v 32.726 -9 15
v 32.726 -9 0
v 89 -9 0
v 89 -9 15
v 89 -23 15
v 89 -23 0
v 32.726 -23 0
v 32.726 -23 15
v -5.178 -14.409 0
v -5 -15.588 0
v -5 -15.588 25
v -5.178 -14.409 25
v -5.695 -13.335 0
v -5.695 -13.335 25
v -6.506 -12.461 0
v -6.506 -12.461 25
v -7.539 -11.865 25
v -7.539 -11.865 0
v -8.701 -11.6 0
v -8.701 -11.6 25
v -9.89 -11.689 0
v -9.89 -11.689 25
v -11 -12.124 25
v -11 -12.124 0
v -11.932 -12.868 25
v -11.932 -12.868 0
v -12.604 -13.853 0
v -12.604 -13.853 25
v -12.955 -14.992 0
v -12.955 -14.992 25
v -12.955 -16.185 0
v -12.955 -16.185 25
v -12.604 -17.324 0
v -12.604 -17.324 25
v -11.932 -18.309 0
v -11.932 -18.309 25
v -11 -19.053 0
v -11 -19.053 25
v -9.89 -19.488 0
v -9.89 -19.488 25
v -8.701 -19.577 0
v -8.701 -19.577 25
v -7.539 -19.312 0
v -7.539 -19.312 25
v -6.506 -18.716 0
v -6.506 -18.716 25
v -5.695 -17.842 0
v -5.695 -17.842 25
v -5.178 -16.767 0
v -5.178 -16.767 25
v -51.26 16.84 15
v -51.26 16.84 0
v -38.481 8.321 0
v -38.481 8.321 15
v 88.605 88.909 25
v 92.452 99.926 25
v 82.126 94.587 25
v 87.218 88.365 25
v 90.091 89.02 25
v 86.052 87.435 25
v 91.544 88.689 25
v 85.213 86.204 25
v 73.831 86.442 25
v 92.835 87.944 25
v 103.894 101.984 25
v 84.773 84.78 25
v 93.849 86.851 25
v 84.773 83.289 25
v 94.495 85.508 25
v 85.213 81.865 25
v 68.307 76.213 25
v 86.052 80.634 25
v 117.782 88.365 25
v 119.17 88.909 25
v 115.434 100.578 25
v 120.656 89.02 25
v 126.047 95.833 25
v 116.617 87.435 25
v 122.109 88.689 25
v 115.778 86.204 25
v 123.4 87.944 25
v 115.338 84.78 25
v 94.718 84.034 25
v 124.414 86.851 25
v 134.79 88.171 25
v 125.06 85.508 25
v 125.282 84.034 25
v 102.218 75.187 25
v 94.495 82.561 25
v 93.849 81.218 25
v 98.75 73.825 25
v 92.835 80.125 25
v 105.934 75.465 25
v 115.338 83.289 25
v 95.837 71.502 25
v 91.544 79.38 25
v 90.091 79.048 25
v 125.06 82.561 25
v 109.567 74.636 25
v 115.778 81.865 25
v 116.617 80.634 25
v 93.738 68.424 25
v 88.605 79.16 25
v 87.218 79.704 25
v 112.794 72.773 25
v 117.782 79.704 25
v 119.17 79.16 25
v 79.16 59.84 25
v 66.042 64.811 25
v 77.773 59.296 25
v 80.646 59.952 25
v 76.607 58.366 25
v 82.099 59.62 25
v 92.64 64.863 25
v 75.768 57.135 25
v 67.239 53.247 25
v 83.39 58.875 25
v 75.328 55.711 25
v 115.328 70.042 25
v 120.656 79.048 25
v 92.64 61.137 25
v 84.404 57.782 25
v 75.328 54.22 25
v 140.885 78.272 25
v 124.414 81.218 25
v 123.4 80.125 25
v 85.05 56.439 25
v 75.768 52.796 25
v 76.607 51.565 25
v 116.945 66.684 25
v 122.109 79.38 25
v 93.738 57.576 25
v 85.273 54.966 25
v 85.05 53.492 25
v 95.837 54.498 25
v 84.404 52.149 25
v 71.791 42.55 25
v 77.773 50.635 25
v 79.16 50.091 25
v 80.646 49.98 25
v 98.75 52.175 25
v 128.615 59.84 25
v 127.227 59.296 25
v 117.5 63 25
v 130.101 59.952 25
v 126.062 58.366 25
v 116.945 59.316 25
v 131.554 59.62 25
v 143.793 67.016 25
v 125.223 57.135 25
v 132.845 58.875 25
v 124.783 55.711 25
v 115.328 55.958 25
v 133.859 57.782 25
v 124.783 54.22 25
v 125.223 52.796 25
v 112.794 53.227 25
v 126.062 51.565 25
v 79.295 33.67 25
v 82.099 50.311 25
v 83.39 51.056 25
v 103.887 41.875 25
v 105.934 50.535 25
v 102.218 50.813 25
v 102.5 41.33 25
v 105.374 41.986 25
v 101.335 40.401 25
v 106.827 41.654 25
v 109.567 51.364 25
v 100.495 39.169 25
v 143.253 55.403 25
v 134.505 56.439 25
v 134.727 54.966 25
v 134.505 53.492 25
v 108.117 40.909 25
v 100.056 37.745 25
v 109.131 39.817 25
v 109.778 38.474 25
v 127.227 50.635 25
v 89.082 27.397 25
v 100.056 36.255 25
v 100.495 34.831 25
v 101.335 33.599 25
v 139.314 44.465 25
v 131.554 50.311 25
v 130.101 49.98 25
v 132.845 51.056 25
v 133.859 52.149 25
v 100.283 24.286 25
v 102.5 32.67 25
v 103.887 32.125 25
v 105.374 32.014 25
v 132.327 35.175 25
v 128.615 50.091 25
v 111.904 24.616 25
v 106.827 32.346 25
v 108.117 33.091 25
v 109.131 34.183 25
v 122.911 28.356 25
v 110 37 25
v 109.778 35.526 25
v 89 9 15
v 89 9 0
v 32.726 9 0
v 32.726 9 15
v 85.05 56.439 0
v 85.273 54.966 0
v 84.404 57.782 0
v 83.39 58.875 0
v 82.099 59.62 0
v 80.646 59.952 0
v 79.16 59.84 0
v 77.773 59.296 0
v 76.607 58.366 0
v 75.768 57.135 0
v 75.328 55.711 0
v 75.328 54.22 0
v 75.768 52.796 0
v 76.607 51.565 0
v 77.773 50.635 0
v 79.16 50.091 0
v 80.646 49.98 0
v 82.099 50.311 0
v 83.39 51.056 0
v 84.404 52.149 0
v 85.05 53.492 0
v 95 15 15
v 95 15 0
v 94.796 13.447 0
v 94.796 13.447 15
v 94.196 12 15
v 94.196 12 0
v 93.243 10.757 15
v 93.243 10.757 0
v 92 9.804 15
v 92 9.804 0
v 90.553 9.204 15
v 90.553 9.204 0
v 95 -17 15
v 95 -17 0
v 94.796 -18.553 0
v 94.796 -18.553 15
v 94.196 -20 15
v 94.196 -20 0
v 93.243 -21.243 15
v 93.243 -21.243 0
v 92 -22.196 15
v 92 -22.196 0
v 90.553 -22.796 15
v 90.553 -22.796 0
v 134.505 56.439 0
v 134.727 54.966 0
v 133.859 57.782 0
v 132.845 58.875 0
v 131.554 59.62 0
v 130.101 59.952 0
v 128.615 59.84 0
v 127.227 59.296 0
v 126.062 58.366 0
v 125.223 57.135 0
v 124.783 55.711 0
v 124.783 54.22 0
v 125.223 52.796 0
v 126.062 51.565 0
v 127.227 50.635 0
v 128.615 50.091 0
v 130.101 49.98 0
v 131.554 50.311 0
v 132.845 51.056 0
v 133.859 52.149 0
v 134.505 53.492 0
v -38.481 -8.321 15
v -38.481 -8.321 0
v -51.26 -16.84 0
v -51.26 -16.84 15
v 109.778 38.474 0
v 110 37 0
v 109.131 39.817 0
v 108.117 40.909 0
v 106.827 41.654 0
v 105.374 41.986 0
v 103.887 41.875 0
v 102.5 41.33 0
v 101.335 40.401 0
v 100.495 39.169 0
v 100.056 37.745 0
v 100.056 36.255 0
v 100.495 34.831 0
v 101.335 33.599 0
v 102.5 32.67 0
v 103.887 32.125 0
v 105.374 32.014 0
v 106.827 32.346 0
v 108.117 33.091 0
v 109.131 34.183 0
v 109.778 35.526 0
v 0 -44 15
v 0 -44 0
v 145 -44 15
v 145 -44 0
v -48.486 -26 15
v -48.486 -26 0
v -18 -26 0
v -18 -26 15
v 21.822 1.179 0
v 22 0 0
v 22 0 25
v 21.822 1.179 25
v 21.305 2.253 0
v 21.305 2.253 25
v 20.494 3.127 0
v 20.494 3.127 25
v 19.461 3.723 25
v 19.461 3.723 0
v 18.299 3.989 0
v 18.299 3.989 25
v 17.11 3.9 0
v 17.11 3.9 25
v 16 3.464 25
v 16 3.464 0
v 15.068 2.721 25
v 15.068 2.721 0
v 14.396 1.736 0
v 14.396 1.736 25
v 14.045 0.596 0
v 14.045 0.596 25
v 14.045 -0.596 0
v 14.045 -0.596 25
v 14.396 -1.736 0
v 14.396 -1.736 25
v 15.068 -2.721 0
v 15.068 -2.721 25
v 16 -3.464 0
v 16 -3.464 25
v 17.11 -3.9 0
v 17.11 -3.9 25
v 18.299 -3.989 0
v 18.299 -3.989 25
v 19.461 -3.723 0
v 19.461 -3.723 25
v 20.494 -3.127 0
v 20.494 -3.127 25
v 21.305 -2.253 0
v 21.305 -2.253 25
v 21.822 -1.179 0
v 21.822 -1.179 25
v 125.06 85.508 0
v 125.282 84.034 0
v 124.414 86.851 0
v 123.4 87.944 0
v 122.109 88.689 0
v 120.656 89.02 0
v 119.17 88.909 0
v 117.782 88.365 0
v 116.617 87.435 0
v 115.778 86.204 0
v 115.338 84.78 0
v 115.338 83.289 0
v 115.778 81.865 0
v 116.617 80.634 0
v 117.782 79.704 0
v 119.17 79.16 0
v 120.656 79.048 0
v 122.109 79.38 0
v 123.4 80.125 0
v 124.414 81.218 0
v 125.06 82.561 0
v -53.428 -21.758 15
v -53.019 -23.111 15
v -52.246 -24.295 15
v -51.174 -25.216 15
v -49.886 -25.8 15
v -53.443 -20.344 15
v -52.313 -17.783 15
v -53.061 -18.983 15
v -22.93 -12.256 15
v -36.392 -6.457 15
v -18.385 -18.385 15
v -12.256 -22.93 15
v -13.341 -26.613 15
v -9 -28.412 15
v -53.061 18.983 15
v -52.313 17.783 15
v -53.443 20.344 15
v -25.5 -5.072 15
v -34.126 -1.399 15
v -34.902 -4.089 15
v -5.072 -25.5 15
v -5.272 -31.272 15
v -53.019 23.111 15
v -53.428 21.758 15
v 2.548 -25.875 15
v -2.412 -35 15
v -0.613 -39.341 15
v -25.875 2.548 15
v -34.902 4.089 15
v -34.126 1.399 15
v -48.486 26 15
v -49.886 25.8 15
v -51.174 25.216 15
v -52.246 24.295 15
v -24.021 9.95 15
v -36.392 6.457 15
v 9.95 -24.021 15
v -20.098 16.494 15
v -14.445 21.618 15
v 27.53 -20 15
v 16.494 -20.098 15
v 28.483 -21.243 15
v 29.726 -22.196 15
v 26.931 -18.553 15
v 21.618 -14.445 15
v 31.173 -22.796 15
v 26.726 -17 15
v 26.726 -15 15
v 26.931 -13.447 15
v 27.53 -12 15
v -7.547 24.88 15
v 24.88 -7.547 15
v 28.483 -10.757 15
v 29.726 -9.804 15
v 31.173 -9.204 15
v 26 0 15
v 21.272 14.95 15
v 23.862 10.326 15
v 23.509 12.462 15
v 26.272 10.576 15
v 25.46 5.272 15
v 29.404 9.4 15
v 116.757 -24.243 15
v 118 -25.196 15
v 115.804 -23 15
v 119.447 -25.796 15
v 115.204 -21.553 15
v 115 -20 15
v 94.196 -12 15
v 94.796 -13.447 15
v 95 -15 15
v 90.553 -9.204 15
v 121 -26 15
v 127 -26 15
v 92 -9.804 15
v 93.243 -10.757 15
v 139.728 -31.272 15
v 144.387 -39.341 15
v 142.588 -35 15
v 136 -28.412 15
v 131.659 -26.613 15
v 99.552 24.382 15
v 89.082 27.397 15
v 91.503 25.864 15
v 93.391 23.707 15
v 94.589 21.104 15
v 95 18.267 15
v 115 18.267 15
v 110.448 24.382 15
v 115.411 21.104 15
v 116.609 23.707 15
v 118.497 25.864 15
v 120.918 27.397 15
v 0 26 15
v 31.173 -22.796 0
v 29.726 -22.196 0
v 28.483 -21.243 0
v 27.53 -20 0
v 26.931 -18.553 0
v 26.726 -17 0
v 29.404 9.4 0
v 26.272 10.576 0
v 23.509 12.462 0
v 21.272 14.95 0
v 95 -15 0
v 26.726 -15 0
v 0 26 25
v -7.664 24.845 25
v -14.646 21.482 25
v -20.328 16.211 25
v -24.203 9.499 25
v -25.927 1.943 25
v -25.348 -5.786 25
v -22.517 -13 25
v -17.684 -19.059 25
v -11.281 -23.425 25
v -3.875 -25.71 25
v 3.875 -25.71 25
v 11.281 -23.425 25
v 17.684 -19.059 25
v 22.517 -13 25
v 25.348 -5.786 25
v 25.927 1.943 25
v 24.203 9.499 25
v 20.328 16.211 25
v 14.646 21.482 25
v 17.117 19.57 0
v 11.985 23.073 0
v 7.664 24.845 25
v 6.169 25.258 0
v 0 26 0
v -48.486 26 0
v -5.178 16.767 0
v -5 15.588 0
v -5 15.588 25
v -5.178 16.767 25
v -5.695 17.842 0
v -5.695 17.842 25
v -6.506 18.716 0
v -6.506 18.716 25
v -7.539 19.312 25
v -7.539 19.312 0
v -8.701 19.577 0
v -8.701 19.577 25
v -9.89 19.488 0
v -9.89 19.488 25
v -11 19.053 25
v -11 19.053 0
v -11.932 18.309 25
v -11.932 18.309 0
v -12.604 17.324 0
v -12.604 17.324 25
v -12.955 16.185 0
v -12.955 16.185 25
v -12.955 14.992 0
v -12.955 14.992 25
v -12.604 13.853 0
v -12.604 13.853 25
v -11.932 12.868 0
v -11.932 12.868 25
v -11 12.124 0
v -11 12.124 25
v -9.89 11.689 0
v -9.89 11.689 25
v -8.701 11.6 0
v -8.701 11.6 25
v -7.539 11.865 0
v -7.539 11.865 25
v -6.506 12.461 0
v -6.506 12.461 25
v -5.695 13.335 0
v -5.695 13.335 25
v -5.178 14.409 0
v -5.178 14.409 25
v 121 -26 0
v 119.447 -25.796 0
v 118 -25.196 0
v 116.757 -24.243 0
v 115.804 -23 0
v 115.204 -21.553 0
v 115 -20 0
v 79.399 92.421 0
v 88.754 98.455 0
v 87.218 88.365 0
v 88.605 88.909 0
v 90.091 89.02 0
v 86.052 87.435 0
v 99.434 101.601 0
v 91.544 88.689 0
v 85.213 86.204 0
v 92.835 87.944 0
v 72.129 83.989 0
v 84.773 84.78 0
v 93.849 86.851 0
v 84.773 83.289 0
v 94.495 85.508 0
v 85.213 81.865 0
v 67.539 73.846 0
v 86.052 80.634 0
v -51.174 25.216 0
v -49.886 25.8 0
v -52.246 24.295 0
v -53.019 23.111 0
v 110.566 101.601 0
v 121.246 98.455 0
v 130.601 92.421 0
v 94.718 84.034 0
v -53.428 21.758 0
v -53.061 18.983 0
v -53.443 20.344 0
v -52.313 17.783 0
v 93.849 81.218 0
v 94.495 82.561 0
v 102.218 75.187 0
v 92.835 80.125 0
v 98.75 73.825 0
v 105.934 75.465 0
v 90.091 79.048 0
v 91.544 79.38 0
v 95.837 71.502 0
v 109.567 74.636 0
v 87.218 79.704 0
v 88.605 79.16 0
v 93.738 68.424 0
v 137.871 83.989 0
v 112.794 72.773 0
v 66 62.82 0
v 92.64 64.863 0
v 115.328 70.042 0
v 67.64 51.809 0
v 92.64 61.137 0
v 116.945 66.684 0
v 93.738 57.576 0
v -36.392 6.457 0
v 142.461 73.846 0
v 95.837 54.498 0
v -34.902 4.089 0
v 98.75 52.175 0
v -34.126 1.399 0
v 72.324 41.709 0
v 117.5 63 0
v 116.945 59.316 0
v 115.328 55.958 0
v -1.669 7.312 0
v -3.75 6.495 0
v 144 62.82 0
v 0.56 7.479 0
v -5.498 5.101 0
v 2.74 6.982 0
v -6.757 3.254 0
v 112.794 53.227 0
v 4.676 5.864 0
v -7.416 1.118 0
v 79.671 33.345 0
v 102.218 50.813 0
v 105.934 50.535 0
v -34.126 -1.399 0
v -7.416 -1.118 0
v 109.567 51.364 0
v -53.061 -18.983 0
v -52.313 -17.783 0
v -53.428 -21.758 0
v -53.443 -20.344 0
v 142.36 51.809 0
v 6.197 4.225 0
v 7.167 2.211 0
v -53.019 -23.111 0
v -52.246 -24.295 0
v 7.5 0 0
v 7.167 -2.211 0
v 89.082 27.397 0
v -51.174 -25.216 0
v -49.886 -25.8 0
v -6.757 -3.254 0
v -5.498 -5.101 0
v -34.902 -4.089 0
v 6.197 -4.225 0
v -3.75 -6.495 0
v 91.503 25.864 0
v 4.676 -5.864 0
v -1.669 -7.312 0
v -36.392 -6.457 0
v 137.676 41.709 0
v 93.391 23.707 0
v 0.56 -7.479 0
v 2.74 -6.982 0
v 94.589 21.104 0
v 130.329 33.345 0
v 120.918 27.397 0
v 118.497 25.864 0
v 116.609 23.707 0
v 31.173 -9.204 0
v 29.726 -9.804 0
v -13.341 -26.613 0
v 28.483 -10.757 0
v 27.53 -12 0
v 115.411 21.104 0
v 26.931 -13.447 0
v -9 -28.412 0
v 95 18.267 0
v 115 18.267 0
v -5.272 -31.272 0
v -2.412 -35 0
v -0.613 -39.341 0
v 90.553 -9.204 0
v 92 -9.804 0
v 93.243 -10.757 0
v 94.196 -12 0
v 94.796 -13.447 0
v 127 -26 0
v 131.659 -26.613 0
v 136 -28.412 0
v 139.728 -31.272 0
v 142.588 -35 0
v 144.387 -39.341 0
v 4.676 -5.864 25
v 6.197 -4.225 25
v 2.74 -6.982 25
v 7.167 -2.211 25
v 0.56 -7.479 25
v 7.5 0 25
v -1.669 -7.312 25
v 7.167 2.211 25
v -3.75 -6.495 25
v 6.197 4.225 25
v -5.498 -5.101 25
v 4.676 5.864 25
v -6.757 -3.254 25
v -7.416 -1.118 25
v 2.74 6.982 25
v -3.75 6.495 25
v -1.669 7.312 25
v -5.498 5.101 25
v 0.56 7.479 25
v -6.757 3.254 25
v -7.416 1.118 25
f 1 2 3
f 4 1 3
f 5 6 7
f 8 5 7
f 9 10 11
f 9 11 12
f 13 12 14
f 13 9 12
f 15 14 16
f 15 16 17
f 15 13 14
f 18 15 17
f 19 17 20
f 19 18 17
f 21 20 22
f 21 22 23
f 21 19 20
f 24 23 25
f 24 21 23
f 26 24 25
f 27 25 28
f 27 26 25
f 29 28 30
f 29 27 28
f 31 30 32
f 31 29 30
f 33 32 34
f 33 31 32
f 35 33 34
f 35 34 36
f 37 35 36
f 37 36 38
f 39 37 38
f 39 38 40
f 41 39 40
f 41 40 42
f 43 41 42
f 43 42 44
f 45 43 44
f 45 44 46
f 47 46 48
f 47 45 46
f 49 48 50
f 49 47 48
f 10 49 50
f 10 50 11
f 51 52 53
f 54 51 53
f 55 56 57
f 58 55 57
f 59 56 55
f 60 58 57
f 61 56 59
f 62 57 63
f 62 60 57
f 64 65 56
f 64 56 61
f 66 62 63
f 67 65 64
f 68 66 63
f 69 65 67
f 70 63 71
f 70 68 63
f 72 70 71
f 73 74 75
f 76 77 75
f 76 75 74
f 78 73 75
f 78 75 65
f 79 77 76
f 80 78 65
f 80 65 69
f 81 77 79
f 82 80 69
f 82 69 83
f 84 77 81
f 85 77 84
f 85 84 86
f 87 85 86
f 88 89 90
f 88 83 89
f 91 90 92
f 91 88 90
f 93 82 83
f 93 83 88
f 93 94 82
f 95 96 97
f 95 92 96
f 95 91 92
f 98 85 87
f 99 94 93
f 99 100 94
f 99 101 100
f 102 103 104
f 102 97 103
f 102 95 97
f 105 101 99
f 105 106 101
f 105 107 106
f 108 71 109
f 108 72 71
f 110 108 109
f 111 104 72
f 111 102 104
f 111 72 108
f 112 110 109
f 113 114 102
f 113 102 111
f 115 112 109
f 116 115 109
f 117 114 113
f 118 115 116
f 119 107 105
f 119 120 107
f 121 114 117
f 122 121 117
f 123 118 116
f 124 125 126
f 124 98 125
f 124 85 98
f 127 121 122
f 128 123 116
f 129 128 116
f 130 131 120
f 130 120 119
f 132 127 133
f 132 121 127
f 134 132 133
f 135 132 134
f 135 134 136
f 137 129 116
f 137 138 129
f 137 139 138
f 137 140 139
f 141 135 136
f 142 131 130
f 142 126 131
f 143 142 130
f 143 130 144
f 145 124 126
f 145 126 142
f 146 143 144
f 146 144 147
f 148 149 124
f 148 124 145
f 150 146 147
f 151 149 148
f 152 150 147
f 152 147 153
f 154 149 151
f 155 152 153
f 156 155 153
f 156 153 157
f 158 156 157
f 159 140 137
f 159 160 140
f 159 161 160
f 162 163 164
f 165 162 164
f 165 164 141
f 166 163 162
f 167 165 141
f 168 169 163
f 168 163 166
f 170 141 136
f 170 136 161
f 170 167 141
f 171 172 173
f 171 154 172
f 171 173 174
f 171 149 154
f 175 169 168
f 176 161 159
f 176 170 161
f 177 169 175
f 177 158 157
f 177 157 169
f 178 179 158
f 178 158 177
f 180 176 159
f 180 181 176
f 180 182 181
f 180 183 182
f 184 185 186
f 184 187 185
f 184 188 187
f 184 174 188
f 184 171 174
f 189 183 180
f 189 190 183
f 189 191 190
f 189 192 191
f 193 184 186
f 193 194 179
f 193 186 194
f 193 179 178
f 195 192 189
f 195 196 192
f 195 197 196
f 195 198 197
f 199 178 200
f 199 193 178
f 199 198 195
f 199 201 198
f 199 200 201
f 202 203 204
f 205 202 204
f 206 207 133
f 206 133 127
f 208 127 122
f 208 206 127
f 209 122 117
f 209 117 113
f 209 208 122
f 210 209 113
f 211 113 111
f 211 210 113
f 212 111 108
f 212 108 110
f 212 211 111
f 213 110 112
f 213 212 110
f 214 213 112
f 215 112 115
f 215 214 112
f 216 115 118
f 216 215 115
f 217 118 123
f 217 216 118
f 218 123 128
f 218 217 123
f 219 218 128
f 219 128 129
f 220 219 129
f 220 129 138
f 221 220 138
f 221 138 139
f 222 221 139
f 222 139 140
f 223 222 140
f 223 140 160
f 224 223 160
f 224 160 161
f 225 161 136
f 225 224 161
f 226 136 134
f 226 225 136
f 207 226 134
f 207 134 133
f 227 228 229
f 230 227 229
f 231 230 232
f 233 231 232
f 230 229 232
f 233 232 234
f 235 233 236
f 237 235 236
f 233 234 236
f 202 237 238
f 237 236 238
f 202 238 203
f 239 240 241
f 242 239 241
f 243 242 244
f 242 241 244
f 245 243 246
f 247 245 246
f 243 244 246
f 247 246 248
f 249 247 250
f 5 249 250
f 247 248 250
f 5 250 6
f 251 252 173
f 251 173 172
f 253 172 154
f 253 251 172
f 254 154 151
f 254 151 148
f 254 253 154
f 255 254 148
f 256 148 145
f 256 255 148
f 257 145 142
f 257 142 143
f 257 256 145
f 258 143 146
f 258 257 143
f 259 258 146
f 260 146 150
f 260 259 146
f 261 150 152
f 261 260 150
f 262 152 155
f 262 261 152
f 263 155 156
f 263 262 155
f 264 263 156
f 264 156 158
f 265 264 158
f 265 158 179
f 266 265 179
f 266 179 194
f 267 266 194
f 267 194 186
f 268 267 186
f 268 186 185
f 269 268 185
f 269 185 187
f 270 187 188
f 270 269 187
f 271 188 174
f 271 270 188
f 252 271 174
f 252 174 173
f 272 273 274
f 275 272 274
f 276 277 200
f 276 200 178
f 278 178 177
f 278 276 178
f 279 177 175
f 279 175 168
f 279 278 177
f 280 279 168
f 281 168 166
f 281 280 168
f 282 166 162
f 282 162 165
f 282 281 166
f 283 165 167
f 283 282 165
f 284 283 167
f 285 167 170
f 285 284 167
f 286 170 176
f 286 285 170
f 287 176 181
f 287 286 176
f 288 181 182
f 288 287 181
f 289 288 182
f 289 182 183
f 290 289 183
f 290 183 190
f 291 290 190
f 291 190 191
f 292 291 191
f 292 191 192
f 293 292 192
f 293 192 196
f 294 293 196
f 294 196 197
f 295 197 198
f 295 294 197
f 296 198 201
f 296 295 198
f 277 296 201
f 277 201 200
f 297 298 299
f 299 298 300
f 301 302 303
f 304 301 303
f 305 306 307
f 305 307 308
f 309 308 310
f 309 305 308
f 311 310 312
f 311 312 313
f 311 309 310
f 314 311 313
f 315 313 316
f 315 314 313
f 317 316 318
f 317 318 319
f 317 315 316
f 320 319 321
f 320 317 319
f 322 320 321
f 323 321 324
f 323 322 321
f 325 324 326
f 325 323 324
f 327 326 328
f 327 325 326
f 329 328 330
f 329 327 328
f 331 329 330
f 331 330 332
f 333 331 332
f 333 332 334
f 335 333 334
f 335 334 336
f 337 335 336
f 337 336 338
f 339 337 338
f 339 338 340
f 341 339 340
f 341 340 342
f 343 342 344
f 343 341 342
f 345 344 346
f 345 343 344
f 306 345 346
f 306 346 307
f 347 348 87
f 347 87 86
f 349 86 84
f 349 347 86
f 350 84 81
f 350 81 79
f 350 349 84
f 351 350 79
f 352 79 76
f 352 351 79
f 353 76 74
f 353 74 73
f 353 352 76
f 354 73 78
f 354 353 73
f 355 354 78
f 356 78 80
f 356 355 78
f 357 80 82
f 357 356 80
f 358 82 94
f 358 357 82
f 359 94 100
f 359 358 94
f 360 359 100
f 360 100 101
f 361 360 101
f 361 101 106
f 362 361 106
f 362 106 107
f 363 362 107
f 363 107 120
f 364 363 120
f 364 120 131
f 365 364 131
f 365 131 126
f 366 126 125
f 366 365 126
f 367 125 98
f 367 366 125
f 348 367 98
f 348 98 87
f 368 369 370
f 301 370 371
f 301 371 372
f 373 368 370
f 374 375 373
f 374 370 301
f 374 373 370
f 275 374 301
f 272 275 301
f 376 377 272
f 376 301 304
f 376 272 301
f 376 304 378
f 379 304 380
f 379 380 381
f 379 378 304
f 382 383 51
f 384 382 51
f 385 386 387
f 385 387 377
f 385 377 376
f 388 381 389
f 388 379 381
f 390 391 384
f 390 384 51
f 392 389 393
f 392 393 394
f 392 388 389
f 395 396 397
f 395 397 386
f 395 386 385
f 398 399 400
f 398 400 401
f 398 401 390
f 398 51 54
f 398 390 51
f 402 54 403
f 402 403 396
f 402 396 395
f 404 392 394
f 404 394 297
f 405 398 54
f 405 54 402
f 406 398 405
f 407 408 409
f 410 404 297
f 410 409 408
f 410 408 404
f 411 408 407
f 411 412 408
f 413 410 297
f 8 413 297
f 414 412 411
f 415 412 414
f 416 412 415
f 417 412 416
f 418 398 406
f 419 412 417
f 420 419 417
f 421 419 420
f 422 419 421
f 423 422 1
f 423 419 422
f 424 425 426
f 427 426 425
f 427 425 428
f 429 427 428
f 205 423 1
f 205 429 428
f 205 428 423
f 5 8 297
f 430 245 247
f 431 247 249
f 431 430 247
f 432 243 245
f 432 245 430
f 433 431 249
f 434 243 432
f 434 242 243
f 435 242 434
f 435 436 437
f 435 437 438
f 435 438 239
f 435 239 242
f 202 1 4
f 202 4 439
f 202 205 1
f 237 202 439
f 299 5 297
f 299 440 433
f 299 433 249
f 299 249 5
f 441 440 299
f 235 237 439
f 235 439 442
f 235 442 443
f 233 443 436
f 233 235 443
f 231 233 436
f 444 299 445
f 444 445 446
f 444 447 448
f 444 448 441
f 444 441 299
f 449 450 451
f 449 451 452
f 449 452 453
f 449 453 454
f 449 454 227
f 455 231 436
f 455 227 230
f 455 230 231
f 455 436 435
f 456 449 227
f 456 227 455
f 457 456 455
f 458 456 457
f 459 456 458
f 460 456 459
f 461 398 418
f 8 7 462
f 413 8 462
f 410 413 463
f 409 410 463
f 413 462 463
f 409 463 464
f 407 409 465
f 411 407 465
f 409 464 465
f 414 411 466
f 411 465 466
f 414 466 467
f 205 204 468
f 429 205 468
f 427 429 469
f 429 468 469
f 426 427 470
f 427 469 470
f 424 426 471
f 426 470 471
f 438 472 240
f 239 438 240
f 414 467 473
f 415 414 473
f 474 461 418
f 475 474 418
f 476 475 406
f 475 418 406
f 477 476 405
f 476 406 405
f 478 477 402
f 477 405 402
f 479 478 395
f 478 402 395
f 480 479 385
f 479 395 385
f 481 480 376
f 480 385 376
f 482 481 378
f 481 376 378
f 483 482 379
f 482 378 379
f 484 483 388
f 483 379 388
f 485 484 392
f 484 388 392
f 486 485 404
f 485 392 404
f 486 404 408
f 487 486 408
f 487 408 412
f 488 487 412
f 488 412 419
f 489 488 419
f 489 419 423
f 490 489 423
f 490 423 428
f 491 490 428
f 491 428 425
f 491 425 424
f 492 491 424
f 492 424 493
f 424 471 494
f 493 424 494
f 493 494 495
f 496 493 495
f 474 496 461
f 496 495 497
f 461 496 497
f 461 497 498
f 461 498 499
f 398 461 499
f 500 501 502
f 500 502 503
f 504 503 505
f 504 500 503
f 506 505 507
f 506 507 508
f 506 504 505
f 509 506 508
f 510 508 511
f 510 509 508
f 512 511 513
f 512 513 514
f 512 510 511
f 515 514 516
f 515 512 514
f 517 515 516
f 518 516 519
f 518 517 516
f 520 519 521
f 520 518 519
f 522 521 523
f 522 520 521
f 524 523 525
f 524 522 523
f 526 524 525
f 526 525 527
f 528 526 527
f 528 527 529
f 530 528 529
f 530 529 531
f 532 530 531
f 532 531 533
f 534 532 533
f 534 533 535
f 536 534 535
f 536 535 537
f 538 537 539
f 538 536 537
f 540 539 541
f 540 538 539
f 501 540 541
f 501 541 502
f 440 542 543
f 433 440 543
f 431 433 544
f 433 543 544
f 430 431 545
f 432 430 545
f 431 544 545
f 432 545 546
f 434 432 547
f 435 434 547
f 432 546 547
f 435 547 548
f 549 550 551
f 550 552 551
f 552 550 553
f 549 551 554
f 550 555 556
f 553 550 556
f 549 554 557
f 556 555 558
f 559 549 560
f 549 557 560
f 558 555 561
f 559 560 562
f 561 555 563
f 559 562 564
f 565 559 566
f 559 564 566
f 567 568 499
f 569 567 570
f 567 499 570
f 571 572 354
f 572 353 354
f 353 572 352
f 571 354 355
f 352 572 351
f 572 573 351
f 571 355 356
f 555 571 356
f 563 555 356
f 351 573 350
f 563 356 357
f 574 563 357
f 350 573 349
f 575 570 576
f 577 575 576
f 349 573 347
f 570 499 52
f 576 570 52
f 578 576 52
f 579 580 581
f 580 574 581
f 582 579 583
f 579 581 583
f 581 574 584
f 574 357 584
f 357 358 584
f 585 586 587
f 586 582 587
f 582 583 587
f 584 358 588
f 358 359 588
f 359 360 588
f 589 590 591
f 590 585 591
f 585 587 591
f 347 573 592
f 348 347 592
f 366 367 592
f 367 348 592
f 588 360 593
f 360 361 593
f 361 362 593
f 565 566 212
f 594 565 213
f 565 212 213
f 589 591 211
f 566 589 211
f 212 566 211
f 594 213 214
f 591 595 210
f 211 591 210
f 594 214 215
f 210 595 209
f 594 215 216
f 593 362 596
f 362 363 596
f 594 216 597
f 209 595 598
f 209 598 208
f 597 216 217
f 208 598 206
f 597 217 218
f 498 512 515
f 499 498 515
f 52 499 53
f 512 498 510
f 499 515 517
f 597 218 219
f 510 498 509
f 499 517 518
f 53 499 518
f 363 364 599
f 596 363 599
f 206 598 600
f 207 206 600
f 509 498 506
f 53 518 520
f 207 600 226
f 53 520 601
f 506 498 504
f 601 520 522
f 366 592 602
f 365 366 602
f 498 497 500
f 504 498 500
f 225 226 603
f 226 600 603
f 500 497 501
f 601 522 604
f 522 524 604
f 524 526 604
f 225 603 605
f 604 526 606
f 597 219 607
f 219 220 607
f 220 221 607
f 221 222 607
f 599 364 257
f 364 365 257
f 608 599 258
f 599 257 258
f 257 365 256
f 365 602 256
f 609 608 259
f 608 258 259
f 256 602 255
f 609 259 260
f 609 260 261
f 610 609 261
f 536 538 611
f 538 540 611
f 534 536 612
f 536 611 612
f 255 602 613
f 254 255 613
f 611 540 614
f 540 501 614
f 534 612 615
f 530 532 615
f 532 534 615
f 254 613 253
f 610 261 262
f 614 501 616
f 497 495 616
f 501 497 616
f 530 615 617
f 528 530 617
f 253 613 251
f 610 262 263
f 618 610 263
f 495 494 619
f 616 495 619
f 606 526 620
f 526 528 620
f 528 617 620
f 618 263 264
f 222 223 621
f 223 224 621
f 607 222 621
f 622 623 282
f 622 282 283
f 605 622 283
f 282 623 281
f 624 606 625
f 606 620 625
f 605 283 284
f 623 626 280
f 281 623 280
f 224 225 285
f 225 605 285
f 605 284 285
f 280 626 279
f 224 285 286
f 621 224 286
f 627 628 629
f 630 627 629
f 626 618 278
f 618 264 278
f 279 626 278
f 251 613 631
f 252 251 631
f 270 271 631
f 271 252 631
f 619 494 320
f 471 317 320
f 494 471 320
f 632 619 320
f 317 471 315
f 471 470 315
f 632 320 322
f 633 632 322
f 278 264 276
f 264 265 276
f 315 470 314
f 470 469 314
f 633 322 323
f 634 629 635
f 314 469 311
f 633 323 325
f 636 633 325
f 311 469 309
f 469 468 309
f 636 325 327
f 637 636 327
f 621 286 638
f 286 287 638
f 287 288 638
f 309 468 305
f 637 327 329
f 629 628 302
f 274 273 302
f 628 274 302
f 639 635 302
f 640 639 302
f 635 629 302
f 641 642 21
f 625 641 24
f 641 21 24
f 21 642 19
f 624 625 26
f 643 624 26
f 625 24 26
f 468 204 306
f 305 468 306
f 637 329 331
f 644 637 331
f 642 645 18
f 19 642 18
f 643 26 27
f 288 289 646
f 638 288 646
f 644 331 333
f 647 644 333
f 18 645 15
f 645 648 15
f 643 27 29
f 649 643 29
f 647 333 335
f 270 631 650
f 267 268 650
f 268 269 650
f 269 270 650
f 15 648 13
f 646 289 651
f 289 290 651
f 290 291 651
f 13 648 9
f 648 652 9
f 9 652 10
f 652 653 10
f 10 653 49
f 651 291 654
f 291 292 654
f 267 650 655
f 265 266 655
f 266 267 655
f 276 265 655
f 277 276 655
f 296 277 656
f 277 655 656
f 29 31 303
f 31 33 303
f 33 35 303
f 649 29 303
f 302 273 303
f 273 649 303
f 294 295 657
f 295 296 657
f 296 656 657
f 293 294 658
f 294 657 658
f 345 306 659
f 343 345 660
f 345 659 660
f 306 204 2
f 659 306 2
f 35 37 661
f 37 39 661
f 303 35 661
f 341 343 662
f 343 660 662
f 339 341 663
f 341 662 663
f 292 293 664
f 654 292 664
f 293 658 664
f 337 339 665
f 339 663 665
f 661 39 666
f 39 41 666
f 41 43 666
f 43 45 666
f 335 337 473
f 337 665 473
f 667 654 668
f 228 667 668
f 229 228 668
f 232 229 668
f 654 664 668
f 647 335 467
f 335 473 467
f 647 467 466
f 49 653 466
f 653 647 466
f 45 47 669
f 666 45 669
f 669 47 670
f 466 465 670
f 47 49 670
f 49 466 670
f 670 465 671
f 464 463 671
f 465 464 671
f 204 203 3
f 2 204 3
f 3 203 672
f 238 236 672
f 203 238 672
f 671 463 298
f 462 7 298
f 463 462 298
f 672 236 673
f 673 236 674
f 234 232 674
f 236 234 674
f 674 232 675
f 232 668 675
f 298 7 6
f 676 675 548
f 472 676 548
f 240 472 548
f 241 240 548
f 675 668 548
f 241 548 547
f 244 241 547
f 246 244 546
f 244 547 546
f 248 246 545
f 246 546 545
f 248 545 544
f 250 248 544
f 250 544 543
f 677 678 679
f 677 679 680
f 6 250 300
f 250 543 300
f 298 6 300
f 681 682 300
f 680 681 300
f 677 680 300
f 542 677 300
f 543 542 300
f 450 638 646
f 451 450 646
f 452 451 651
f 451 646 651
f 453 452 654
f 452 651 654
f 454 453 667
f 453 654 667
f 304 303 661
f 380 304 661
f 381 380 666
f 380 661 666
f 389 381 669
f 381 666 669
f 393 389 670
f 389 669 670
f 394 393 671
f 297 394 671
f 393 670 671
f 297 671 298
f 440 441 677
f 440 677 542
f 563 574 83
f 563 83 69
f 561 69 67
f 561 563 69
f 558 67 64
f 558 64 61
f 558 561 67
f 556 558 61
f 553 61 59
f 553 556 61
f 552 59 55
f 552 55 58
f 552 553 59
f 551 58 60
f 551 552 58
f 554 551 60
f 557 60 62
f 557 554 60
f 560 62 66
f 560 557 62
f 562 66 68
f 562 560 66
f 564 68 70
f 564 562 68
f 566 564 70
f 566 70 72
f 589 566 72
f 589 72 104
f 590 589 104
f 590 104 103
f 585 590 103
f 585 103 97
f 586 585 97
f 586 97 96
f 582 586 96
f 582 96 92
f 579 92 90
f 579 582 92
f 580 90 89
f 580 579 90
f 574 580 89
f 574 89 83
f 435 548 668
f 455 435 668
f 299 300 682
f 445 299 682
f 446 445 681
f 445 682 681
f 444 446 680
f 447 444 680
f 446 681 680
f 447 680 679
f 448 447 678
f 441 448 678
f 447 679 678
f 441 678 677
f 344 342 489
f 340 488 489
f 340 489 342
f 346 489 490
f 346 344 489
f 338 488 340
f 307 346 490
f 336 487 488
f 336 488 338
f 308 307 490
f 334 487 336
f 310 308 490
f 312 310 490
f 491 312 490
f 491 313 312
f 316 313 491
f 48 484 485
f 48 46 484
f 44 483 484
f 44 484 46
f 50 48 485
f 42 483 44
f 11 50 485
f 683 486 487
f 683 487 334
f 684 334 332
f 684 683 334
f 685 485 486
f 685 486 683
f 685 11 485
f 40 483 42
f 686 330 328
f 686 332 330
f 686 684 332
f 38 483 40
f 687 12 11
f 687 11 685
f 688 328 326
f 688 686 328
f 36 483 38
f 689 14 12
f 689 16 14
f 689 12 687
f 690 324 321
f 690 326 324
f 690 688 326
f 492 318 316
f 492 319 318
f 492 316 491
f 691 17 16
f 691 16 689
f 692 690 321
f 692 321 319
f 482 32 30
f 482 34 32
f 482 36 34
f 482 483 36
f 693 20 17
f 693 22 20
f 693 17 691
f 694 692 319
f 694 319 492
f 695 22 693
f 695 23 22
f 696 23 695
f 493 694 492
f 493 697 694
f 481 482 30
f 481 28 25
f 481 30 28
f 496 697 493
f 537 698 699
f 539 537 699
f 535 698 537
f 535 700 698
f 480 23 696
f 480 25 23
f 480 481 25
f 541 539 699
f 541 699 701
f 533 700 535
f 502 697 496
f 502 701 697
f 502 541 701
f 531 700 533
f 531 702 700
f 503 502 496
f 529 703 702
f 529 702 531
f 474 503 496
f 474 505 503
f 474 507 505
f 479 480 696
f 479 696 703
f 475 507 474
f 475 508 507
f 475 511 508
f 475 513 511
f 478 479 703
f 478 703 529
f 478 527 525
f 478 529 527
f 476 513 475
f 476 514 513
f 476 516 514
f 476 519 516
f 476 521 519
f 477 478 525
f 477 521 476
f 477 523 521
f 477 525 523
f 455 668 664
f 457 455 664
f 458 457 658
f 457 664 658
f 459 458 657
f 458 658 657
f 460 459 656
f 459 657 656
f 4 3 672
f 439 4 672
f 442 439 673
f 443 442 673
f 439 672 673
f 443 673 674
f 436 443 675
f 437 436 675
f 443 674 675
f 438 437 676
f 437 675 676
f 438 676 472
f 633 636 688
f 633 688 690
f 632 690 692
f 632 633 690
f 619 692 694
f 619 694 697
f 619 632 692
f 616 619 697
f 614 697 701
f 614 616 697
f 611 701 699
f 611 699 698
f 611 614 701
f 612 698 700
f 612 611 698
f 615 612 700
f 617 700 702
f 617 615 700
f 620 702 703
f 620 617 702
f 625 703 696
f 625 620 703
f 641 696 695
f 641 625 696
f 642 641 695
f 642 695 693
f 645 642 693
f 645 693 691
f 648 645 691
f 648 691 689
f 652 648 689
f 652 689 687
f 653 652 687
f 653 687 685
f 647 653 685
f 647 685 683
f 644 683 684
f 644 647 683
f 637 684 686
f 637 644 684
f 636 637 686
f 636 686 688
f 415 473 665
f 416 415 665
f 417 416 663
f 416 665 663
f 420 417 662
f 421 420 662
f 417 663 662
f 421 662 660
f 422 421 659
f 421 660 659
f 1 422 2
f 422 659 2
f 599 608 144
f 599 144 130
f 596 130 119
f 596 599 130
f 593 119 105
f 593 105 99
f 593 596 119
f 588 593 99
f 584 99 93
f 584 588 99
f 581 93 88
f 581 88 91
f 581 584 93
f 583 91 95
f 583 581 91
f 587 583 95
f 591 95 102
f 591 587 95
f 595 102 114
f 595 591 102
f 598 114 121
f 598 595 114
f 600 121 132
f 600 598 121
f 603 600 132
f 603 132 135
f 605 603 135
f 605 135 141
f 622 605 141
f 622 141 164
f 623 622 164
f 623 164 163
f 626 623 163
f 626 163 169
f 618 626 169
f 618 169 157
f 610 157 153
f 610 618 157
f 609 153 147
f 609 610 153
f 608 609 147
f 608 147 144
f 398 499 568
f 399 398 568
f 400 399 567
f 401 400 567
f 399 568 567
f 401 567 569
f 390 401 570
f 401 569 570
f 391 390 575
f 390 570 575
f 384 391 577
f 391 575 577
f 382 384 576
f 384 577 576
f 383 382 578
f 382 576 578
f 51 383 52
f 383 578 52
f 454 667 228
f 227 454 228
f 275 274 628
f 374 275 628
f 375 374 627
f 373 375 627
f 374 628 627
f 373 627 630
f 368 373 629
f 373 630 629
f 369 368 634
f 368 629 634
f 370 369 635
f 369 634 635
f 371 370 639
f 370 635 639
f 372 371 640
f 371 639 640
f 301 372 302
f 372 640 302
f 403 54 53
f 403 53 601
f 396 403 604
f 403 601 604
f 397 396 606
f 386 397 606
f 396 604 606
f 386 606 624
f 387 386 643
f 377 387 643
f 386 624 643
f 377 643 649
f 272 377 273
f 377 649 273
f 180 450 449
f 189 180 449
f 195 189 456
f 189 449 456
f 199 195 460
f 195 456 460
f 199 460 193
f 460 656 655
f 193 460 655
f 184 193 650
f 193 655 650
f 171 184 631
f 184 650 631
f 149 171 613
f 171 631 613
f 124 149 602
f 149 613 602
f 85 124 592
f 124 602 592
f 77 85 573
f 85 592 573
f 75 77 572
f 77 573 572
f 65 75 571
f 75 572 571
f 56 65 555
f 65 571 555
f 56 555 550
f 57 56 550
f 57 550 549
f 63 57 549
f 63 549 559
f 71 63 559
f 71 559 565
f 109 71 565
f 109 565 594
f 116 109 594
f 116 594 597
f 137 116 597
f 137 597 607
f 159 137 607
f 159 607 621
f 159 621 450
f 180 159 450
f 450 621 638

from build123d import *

# Parameters (mm, degrees)
EXTRUDE_1_DEPTH = 15
SKETCH_1_3_R    = 26
SKETCH_1_3_R_2  = 4
SKETCH_1_3_R_3  = 7.5
SKETCH_1_3_R_4  = 39
SKETCH_1_3_R_5  = 5
SKETCH_1_3_R_6  = 12.5
EXTRUDE_4_DEPTH = 25
EXTRUDE_5_DEPTH = 10


with BuildPart() as part:
    # Эскиз1 → Бобышка-Вытянуть1 (new body)
    with BuildSketch(Plane.XY):
        with BuildLine():
            Line((0, 26), (-48.486121811, 26))
            ThreePointArc((-48.486121811, 26), (-53.271581944, 22.448920743), (-51.259622792, 16.839748528))
            Line((-51.259622792, 16.839748528), (-38.480754415, 8.320502943))
            ThreePointArc((-38.480754415, 8.320502943), (-34.027756377, 0), (-38.480754415, -8.320502943))
            Line((-38.480754415, -8.320502943), (-51.259622792, -16.839748528))
            ThreePointArc((-51.259622792, -16.839748528), (-53.271581944, -22.448920743), (-48.486121811, -26))
            Line((-48.486121811, -26), (-18, -26))
            ThreePointArc((-18, -26), (-5.272077939, -31.272077939), (0, -44))
            Line((0, -44), (145, -44))
            ThreePointArc((145, -44), (139.727922061, -31.272077939), (127, -26))
            Line((127, -26), (121, -26))
            ThreePointArc((121, -26), (116.757359313, -24.242640687), (115, -20))
            Line((115, -20), (115, 18.267461507))
            ThreePointArc((115, 18.267461507), (116.609042768, 23.70729944), (120.918367347, 27.396550996))
            ThreePointArc((120.918367347, 27.396550996), (105, 24), (89.081632653, 27.396550996))
            ThreePointArc((89.081632653, 27.396550996), (93.390957232, 23.70729944), (95, 18.267461507))
            Line((95, 18.267461507), (95, 15))
            ThreePointArc((95, 15), (93.242640687, 10.757359313), (89, 9))
            Line((89, 9), (32.726136344, 9))
            ThreePointArc((32.726136344, 9), (26.272455224, 10.576232455), (21.271988624, 14.95))
            ThreePointArc((21.271988624, 14.95), (24.789833644, 7.839907391), (26, 0))
            ThreePointArc((26, 0), (-18.384776311, -18.384776311), (0, 26))
        make_face()
        with BuildLine():
            Line((89, -23), (32.726136344, -23))
            ThreePointArc((32.726136344, -23), (28.483495657, -21.242640687), (26.726136344, -17))
            Line((26.726136344, -17), (26.726136344, -15))
            ThreePointArc((26.726136344, -15), (28.483495657, -10.757359313), (32.726136344, -9))
            Line((32.726136344, -9), (89, -9))
            ThreePointArc((89, -9), (93.242640687, -10.757359313), (95, -15))
            Line((95, -15), (95, -17))
            ThreePointArc((95, -17), (93.242640687, -21.242640687), (89, -23))
        make_face(mode=Mode.SUBTRACT)
    extrude(amount=EXTRUDE_1_DEPTH)

    # Эскиз1<3> → Бобышка-Вытянуть4 (add)
    # profile 1 of 2: a face of its own
    with BuildSketch(Plane.XY):
        Circle(SKETCH_1_3_R)
        with Locations((-9, -15.588457268)):
            Circle(SKETCH_1_3_R_2, mode=Mode.SUBTRACT)
        with Locations((-9, 15.588457268)):
            Circle(SKETCH_1_3_R_2, mode=Mode.SUBTRACT)
        Circle(SKETCH_1_3_R_3, mode=Mode.SUBTRACT)
        with Locations((18, 0)):
            Circle(SKETCH_1_3_R_2, mode=Mode.SUBTRACT)
    # profile 2 of 2: a face of its own
    with BuildSketch(Plane.XY):
        with Locations((105, 63)):
            Circle(SKETCH_1_3_R_4)
        with Locations((80.272530576, 54.965558146)):
            Circle(SKETCH_1_3_R_5, mode=Mode.SUBTRACT)
        with Locations((105, 37)):
            Circle(SKETCH_1_3_R_5, mode=Mode.SUBTRACT)
        with Locations((105, 63)):
            Circle(SKETCH_1_3_R_6, mode=Mode.SUBTRACT)
        with Locations((129.727469424, 54.965558146)):
            Circle(SKETCH_1_3_R_5, mode=Mode.SUBTRACT)
        with Locations((89.71758344, 84.034441854)):
            Circle(SKETCH_1_3_R_5, mode=Mode.SUBTRACT)
        with Locations((120.28241656, 84.034441854)):
            Circle(SKETCH_1_3_R_5, mode=Mode.SUBTRACT)
    extrude(amount=EXTRUDE_4_DEPTH)

    # Эскиз1<4> → Бобышка-Вытянуть5 (add)
    with BuildSketch(Plane.XY):
        with BuildLine():
            Line((0, 26), (-48.486121811, 26))
            ThreePointArc((-48.486121811, 26), (-53.271581944, 22.448920743), (-51.259622792, 16.839748528))
            Line((-51.259622792, 16.839748528), (-38.480754415, 8.320502943))
            ThreePointArc((-38.480754415, 8.320502943), (-34.027756377, 0), (-38.480754415, -8.320502943))
            Line((-38.480754415, -8.320502943), (-51.259622792, -16.839748528))
            ThreePointArc((-51.259622792, -16.839748528), (-53.271581944, -22.448920743), (-48.486121811, -26))
            Line((-48.486121811, -26), (-18, -26))
            ThreePointArc((-18, -26), (-5.272077939, -31.272077939), (0, -44))
            Line((0, -44), (145, -44))
            ThreePointArc((145, -44), (139.727922061, -31.272077939), (127, -26))
            Line((127, -26), (121, -26))
            ThreePointArc((121, -26), (116.757359313, -24.242640687), (115, -20))
            Line((115, -20), (115, 18.267461507))
            ThreePointArc((115, 18.267461507), (116.609042768, 23.70729944), (120.918367347, 27.396550996))
            ThreePointArc((120.918367347, 27.396550996), (105, 24), (89.081632653, 27.396550996))
            ThreePointArc((89.081632653, 27.396550996), (93.390957232, 23.70729944), (95, 18.267461507))
            Line((95, 18.267461507), (95, 15))
            ThreePointArc((95, 15), (93.242640687, 10.757359313), (89, 9))
            Line((89, 9), (32.726136344, 9))
            ThreePointArc((32.726136344, 9), (26.272455224, 10.576232455), (21.271988624, 14.95))
            ThreePointArc((21.271988624, 14.95), (24.789833644, 7.839907391), (26, 0))
            ThreePointArc((26, 0), (-18.384776311, -18.384776311), (0, 26))
        make_face()
        with BuildLine():
            Line((89, -23), (32.726136344, -23))
            ThreePointArc((32.726136344, -23), (28.483495657, -21.242640687), (26.726136344, -17))
            Line((26.726136344, -17), (26.726136344, -15))
            ThreePointArc((26.726136344, -15), (28.483495657, -10.757359313), (32.726136344, -9))
            Line((32.726136344, -9), (89, -9))
            ThreePointArc((89, -9), (93.242640687, -10.757359313), (95, -15))
            Line((95, -15), (95, -17))
            ThreePointArc((95, -17), (93.242640687, -21.242640687), (89, -23))
        make_face(mode=Mode.SUBTRACT)
    extrude(amount=EXTRUDE_5_DEPTH)


solid = part.part
